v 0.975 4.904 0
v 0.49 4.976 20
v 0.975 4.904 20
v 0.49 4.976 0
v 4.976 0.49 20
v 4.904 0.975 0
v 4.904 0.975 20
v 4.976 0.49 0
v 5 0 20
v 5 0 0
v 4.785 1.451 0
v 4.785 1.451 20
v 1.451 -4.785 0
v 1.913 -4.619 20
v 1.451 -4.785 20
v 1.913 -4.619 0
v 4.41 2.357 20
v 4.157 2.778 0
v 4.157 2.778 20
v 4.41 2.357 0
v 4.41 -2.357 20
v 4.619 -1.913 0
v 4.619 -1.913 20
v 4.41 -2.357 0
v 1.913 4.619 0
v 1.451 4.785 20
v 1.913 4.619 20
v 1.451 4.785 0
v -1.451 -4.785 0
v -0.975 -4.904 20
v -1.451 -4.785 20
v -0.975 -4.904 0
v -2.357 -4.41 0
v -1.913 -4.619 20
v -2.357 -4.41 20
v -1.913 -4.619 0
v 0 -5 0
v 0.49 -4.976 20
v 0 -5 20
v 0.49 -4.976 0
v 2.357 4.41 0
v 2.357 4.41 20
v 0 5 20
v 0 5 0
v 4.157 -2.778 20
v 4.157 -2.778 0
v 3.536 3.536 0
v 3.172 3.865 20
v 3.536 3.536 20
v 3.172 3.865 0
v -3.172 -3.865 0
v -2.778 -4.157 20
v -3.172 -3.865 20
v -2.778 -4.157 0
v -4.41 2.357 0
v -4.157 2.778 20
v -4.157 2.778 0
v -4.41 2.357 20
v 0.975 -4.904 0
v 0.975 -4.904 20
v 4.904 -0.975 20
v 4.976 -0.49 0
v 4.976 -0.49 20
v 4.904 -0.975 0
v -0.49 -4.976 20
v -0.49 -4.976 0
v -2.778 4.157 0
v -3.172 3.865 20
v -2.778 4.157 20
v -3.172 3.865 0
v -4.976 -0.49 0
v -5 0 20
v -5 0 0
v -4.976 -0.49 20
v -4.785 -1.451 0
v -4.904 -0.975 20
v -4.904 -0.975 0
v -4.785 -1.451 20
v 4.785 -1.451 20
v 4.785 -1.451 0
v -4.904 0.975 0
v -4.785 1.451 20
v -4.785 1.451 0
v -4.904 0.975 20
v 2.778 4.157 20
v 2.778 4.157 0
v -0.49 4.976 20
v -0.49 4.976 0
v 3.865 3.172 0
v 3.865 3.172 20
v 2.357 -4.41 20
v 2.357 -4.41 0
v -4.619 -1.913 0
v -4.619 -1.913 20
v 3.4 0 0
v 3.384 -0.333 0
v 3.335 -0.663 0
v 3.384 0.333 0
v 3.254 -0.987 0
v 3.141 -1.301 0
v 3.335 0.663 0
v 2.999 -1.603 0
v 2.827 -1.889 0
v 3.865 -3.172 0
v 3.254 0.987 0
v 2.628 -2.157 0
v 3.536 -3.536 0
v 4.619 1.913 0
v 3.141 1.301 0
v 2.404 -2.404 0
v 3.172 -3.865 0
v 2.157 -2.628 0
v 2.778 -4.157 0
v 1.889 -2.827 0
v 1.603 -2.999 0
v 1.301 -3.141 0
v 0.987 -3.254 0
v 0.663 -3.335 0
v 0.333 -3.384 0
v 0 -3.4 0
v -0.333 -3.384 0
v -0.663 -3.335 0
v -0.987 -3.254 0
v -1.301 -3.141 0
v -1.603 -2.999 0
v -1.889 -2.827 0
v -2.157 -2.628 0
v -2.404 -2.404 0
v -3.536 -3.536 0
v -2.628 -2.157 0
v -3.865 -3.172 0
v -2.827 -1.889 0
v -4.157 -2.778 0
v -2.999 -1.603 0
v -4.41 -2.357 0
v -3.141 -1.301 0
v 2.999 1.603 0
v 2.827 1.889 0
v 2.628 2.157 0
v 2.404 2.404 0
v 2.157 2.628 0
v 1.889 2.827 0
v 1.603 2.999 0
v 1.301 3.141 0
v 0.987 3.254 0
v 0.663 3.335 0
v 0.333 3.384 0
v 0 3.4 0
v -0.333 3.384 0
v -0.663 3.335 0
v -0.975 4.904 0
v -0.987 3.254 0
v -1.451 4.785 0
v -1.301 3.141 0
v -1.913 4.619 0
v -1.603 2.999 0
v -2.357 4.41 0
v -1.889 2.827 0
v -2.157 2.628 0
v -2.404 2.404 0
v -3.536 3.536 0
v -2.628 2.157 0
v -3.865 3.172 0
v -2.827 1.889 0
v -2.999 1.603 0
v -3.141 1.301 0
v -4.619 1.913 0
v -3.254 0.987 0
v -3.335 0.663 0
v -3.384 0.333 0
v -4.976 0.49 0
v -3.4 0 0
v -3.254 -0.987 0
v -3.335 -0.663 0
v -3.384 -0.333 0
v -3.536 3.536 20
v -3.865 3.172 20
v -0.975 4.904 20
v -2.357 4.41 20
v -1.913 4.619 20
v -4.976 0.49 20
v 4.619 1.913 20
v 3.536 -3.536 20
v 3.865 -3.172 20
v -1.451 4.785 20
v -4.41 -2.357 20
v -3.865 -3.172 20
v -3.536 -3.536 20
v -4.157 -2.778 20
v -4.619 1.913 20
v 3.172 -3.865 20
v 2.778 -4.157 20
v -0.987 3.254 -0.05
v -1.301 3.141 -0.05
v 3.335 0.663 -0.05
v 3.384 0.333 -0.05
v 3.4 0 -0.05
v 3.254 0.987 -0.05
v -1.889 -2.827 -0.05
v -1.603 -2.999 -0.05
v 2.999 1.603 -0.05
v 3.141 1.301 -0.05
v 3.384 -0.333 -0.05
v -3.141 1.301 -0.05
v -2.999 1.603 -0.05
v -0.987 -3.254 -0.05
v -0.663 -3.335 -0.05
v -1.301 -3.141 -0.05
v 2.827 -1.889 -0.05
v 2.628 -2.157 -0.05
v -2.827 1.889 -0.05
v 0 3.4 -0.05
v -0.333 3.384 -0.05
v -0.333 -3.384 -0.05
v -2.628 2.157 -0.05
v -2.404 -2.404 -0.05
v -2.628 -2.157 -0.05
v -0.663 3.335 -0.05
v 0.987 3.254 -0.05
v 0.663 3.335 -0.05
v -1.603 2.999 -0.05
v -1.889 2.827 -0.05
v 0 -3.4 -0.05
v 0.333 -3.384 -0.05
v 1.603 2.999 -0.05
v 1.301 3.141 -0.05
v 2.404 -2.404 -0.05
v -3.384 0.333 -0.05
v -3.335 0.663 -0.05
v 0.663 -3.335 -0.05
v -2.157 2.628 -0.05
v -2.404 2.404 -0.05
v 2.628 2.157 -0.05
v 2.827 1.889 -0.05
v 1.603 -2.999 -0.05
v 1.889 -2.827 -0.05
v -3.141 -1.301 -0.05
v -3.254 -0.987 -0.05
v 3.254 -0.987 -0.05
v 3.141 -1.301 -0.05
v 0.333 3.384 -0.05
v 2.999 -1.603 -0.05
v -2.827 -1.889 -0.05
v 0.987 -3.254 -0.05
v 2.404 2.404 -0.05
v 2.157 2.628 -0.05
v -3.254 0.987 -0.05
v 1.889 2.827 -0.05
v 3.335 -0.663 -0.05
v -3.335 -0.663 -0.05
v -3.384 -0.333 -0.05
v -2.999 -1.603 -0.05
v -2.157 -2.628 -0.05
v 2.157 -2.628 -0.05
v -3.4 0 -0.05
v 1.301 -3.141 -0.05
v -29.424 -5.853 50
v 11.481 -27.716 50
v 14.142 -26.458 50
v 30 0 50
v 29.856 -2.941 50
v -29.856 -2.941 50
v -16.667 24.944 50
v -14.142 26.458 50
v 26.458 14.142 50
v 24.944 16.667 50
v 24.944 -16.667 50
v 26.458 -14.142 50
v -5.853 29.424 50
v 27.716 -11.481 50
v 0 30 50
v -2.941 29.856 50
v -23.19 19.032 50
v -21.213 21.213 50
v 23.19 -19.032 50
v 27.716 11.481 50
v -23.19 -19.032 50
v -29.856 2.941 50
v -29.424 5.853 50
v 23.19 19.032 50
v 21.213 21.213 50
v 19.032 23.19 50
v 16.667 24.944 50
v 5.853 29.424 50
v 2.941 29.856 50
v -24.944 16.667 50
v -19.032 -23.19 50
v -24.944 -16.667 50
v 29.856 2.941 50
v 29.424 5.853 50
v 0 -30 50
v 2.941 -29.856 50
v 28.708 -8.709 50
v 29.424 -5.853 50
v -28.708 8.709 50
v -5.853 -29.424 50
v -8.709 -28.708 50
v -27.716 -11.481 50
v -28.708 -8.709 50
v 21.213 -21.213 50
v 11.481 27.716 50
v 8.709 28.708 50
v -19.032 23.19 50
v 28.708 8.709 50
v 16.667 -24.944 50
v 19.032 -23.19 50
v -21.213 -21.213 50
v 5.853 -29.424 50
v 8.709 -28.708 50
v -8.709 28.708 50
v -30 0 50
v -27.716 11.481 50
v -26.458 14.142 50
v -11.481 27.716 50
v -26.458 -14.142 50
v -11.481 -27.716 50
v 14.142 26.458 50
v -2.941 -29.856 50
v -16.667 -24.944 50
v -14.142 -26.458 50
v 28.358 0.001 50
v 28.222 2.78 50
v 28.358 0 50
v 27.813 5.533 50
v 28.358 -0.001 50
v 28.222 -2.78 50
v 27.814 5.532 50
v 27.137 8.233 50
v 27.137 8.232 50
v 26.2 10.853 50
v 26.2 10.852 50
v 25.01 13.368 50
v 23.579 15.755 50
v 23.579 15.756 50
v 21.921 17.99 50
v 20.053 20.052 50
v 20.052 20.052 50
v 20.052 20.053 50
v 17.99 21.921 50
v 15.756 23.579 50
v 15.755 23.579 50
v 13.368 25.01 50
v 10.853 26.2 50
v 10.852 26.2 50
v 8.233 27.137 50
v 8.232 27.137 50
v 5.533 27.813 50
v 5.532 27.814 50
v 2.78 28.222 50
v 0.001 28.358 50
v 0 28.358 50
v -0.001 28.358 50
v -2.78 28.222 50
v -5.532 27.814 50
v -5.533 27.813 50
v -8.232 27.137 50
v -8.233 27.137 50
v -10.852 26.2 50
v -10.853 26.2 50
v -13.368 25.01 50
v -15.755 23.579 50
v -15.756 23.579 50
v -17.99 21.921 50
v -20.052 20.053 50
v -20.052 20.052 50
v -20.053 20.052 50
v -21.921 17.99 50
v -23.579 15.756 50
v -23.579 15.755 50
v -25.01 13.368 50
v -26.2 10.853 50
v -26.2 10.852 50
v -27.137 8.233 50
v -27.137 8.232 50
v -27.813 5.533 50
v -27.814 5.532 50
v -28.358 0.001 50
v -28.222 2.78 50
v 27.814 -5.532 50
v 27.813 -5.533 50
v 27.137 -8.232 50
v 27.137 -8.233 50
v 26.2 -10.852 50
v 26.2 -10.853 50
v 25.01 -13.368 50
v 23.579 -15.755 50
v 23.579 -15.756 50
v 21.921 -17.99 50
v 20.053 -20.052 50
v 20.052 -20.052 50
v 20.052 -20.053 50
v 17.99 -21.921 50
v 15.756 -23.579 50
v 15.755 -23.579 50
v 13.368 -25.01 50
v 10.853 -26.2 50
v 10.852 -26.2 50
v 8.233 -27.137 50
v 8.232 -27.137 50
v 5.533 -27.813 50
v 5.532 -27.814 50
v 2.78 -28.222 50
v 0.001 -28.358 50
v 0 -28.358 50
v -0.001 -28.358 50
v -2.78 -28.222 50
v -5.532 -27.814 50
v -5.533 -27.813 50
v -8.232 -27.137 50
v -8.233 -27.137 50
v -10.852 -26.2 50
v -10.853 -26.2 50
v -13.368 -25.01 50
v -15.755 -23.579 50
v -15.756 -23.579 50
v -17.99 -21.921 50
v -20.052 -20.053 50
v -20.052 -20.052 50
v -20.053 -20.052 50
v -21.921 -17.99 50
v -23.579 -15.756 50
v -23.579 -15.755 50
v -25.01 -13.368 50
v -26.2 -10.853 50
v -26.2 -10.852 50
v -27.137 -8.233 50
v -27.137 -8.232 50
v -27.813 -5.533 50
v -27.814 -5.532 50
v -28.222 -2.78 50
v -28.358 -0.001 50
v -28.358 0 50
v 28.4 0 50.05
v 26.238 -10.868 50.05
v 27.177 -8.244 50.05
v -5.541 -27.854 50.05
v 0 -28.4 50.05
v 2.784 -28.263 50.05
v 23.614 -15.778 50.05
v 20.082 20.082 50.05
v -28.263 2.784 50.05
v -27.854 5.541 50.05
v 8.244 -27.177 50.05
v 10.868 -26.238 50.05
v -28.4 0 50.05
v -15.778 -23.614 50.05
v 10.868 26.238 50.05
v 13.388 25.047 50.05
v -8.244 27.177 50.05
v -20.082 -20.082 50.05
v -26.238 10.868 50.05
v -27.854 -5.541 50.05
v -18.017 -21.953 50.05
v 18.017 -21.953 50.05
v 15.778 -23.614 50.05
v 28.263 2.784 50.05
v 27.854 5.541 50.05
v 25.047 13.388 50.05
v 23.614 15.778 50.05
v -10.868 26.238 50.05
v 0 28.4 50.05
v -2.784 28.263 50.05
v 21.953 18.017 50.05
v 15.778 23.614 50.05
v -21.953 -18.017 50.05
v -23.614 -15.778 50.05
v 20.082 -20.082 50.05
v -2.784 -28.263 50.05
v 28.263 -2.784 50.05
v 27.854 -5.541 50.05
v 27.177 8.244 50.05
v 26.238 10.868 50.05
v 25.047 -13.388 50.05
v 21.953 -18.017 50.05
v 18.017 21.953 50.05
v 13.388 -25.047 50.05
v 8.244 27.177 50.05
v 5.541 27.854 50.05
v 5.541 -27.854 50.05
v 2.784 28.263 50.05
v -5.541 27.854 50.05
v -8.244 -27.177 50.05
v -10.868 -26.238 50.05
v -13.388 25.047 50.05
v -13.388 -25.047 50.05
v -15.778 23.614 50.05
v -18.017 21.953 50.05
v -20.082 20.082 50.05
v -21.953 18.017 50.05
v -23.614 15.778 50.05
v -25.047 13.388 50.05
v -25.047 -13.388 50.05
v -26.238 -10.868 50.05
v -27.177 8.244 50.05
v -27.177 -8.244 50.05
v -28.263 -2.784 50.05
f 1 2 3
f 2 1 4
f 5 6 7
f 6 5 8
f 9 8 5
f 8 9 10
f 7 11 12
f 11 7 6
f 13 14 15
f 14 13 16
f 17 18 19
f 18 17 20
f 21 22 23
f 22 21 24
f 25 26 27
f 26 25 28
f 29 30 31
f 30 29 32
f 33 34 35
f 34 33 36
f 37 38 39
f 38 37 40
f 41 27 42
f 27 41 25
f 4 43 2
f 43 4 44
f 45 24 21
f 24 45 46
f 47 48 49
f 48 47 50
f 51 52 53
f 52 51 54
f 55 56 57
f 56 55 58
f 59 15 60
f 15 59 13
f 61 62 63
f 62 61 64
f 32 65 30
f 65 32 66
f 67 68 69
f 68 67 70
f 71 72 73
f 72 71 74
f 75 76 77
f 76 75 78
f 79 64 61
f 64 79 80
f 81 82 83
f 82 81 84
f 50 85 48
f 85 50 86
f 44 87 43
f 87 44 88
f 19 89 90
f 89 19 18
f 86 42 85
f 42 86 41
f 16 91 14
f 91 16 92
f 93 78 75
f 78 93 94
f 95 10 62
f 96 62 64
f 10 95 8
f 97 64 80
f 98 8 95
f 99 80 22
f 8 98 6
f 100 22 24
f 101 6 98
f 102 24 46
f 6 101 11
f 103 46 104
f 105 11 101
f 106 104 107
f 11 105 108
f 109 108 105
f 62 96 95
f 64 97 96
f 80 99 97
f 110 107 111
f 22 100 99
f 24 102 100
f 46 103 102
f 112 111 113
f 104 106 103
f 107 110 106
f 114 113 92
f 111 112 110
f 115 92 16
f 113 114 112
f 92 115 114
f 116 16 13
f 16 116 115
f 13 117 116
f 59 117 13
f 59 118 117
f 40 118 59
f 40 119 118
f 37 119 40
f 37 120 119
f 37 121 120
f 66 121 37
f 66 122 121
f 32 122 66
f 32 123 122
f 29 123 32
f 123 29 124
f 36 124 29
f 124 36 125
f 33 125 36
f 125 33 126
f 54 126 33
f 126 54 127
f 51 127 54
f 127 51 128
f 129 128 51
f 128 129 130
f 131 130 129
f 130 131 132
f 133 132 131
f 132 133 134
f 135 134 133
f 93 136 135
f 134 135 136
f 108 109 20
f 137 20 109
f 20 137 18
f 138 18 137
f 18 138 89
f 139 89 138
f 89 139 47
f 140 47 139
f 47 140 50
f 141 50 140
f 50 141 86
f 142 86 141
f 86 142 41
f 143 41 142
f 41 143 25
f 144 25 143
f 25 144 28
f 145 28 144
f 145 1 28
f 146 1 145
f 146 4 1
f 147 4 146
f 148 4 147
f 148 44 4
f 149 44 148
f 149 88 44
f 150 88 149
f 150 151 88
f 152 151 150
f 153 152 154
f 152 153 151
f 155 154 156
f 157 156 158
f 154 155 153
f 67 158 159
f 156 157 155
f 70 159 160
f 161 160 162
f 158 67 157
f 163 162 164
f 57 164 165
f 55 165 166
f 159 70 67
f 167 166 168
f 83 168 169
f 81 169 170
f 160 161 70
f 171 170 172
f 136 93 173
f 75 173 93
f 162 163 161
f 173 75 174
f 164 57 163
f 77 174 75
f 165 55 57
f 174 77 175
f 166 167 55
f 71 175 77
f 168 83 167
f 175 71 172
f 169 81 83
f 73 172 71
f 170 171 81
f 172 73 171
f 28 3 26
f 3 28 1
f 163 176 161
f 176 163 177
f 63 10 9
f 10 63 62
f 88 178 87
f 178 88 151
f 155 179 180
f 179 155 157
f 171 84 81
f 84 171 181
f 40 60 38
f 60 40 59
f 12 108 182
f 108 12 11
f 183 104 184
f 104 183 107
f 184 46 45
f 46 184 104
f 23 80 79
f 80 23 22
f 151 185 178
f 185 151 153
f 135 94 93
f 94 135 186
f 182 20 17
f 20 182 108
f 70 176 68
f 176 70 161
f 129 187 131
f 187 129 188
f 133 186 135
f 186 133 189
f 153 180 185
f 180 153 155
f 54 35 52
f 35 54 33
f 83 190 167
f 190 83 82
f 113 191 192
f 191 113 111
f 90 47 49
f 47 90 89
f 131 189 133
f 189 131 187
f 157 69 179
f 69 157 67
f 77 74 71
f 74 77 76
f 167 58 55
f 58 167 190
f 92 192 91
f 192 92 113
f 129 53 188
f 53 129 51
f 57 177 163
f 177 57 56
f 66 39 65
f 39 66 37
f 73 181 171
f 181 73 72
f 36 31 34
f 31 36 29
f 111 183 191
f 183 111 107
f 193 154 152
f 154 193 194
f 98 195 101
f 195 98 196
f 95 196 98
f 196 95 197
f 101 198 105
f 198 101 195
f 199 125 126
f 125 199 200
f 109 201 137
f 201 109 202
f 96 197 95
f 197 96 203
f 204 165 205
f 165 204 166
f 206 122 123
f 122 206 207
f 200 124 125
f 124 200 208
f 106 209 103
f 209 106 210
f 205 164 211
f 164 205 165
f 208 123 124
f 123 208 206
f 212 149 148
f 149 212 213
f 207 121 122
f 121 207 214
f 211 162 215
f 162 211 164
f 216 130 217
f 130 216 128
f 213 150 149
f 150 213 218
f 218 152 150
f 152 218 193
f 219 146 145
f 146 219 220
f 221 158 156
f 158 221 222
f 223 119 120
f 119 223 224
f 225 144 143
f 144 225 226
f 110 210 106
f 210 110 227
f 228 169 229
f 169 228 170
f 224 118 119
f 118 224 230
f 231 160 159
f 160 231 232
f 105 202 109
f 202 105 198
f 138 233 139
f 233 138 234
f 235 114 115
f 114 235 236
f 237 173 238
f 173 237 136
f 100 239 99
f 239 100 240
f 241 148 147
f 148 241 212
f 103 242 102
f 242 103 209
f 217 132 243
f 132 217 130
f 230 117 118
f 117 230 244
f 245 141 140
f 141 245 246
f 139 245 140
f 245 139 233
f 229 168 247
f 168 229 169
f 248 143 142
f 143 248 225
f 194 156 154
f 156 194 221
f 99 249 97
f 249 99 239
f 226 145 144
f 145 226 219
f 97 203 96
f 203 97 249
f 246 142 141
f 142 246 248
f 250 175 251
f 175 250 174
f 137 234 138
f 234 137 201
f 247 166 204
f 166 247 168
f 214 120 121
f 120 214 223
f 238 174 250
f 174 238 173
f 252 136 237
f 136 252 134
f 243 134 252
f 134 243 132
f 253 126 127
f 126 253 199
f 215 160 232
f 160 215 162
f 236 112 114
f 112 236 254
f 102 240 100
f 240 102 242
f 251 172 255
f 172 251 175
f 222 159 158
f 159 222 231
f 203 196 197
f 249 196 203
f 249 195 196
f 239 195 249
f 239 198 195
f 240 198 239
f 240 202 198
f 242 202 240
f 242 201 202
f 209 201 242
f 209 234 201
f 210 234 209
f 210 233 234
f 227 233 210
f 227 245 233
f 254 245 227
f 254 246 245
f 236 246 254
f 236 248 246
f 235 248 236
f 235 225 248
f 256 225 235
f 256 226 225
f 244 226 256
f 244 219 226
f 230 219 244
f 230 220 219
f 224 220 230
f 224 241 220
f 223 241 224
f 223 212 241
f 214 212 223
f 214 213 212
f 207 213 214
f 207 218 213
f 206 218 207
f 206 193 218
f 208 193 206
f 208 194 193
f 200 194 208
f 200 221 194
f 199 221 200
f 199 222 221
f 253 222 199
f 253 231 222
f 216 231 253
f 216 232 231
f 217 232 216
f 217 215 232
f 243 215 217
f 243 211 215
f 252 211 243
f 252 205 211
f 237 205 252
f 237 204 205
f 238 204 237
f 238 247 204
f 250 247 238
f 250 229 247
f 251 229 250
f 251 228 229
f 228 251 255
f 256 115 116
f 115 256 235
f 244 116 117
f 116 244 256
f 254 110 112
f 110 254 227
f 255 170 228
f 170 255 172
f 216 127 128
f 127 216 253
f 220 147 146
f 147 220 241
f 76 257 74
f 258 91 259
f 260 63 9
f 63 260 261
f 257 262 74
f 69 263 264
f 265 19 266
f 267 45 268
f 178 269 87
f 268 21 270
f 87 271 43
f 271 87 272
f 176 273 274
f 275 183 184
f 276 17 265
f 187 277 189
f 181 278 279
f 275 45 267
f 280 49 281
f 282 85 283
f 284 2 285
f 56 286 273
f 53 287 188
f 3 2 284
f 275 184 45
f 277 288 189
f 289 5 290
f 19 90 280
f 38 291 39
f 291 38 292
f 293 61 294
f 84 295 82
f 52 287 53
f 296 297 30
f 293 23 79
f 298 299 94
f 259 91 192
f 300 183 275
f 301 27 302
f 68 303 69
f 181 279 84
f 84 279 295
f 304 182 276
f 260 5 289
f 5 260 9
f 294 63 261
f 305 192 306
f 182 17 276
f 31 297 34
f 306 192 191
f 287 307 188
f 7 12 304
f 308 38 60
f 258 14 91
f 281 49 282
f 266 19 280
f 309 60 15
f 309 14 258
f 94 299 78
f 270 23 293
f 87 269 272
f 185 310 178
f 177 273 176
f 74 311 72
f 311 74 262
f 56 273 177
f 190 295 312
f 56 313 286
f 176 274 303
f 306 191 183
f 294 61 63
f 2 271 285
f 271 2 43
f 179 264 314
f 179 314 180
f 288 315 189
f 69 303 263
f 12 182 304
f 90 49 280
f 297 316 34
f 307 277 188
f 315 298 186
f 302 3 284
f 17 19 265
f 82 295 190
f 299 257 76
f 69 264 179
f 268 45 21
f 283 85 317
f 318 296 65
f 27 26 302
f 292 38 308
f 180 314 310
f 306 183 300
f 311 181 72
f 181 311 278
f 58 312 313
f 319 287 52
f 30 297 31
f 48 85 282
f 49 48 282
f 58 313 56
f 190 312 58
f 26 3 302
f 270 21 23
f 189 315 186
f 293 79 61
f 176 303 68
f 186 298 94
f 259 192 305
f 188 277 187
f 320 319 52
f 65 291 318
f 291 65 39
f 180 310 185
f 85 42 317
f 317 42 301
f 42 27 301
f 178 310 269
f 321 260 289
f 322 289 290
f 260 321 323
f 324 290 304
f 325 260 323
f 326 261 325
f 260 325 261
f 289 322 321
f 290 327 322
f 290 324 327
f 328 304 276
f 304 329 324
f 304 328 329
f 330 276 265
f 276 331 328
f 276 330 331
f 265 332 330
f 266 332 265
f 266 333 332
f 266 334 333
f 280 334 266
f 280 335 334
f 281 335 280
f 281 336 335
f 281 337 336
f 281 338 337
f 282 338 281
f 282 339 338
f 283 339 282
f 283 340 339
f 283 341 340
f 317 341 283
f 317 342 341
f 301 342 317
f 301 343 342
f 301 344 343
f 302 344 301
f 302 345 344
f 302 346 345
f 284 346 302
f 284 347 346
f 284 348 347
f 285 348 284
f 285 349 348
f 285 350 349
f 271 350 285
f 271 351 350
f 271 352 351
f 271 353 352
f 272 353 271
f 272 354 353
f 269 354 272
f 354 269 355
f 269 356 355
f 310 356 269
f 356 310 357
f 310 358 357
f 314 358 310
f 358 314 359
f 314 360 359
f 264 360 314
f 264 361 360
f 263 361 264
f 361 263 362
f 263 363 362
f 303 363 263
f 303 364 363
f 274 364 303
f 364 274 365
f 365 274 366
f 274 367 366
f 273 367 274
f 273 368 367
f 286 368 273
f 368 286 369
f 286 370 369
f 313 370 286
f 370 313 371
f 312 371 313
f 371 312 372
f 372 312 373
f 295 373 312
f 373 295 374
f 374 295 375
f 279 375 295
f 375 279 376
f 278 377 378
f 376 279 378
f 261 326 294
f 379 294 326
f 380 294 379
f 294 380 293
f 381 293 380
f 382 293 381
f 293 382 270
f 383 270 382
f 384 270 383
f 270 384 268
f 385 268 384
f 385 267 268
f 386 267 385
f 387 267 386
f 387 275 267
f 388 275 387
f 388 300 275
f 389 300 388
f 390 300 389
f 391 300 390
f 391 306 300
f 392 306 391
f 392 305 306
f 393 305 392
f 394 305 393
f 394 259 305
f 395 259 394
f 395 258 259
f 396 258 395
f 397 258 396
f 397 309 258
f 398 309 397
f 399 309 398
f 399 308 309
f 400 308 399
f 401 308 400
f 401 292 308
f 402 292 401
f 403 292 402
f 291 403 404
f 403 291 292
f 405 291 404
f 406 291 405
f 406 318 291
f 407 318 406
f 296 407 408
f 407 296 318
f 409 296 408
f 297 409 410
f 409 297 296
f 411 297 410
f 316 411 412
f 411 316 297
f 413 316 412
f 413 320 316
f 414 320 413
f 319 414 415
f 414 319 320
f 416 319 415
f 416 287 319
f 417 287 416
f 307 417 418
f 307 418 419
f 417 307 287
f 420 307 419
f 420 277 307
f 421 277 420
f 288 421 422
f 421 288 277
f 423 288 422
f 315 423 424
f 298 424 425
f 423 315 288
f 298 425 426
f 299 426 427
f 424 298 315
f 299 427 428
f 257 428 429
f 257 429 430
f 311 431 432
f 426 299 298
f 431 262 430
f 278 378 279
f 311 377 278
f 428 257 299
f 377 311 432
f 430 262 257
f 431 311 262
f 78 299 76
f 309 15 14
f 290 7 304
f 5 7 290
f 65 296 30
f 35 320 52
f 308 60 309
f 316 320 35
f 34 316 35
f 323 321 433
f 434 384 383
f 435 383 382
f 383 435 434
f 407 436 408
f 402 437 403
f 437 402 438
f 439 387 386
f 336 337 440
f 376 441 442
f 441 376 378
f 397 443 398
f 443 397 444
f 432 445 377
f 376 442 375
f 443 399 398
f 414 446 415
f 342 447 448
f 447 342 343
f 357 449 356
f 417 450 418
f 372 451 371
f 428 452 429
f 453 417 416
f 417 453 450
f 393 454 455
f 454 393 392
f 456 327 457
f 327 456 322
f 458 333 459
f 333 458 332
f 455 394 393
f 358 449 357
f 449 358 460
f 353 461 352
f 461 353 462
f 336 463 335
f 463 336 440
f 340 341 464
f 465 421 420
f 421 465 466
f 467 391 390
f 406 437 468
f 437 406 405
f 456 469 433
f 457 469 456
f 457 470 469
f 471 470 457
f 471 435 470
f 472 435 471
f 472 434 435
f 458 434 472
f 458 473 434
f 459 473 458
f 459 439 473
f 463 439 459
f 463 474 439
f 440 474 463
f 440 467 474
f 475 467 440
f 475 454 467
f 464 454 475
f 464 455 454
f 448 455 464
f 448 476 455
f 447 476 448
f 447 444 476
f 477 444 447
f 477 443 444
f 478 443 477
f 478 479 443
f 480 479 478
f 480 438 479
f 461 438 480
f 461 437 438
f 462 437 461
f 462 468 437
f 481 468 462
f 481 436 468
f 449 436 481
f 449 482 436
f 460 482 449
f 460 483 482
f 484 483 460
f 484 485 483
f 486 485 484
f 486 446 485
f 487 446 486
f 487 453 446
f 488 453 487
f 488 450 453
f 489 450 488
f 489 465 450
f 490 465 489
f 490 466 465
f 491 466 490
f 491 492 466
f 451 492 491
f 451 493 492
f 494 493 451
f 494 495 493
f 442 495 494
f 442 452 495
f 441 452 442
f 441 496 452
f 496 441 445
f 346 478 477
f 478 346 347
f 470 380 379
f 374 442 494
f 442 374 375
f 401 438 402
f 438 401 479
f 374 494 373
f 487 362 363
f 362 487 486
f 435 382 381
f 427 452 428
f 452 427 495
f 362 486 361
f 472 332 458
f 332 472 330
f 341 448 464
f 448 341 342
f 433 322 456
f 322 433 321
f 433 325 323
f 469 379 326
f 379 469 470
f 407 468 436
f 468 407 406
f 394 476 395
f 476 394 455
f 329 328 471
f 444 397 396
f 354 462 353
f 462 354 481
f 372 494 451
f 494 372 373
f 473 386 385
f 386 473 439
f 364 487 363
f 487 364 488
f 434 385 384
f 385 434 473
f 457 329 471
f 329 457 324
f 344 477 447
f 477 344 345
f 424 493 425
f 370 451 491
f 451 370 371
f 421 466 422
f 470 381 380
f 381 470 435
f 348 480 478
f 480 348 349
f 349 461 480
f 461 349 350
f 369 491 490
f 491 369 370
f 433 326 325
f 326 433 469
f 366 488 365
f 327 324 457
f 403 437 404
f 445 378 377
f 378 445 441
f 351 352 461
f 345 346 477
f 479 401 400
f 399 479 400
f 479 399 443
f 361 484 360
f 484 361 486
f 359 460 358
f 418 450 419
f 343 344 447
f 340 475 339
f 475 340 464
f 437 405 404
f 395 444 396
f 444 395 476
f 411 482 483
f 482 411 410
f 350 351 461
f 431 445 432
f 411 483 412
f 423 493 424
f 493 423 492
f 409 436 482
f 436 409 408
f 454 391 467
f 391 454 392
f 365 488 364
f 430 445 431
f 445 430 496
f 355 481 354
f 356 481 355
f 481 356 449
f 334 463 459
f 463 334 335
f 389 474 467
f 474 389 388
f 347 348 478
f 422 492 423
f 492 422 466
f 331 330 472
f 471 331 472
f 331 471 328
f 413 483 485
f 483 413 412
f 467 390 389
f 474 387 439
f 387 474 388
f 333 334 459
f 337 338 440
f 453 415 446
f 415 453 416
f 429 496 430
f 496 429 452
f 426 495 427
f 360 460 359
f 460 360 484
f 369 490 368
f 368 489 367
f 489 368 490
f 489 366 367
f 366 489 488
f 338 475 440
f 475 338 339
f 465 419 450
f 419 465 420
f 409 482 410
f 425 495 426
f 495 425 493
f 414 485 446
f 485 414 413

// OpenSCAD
// Lab Funnel - OpenSCAD Model
// Dimensions measured in millimetres

// Spout dimensions
spout_outer_diameter = 10;          // Outer diameter of the spout (mm)
spout_inner_diameter = 6.8;         // Inner diameter (bore) of the spout (mm)
spout_height = 20;                  // Height of the straight spout section (mm)

// Cone dimensions
cone_bottom_outer_diameter = 10;    // Outer diameter at the base of the cone (matches spout) (mm)
cone_top_outer_diameter = 60;       // Outer diameter at the rim of the funnel (mm)
cone_height = 30;                   // Height of the cone section (z=20 to z=50) (mm)

// Wall thickness
wall_thickness = 1.6;               // Uniform wall thickness (mm)

// Derived dimensions
cone_bottom_inner_diameter = cone_bottom_outer_diameter - 2 * wall_thickness; // 6.8 mm
cone_top_inner_diameter = cone_top_outer_diameter - 2 * wall_thickness;       // 56.8 mm

// Resolution for smooth curves
$fn = 64;

// Main funnel body (union of spout and cone)
union() {
    // Spout section (z = 0 to z = 20)
    // Outer cylinder
    translate([0, 0, 0])
        cylinder(h = spout_height, r = spout_outer_diameter / 2, center = false);
    
    // Spout inner bore (cutout) - extends slightly past bottom and top
    translate([0, 0, -0.05])
        cylinder(h = spout_height + 0.1, r = spout_inner_diameter / 2, center = false);
    
    // Cone section (z = 20 to z = 50)
    // Outer cone
    translate([0, 0, spout_height])
        cylinder(h = cone_height, r1 = cone_bottom_outer_diameter / 2, r2 = cone_top_outer_diameter / 2, center = false);
    
    // Inner cone (cutout) - extends slightly past bottom and top
    translate([0, 0, spout_height - 0.05])
        cylinder(h = cone_height + 0.1, r1 = cone_bottom_inner_diameter / 2, r2 = cone_top_inner_diameter / 2, center = false);
}
